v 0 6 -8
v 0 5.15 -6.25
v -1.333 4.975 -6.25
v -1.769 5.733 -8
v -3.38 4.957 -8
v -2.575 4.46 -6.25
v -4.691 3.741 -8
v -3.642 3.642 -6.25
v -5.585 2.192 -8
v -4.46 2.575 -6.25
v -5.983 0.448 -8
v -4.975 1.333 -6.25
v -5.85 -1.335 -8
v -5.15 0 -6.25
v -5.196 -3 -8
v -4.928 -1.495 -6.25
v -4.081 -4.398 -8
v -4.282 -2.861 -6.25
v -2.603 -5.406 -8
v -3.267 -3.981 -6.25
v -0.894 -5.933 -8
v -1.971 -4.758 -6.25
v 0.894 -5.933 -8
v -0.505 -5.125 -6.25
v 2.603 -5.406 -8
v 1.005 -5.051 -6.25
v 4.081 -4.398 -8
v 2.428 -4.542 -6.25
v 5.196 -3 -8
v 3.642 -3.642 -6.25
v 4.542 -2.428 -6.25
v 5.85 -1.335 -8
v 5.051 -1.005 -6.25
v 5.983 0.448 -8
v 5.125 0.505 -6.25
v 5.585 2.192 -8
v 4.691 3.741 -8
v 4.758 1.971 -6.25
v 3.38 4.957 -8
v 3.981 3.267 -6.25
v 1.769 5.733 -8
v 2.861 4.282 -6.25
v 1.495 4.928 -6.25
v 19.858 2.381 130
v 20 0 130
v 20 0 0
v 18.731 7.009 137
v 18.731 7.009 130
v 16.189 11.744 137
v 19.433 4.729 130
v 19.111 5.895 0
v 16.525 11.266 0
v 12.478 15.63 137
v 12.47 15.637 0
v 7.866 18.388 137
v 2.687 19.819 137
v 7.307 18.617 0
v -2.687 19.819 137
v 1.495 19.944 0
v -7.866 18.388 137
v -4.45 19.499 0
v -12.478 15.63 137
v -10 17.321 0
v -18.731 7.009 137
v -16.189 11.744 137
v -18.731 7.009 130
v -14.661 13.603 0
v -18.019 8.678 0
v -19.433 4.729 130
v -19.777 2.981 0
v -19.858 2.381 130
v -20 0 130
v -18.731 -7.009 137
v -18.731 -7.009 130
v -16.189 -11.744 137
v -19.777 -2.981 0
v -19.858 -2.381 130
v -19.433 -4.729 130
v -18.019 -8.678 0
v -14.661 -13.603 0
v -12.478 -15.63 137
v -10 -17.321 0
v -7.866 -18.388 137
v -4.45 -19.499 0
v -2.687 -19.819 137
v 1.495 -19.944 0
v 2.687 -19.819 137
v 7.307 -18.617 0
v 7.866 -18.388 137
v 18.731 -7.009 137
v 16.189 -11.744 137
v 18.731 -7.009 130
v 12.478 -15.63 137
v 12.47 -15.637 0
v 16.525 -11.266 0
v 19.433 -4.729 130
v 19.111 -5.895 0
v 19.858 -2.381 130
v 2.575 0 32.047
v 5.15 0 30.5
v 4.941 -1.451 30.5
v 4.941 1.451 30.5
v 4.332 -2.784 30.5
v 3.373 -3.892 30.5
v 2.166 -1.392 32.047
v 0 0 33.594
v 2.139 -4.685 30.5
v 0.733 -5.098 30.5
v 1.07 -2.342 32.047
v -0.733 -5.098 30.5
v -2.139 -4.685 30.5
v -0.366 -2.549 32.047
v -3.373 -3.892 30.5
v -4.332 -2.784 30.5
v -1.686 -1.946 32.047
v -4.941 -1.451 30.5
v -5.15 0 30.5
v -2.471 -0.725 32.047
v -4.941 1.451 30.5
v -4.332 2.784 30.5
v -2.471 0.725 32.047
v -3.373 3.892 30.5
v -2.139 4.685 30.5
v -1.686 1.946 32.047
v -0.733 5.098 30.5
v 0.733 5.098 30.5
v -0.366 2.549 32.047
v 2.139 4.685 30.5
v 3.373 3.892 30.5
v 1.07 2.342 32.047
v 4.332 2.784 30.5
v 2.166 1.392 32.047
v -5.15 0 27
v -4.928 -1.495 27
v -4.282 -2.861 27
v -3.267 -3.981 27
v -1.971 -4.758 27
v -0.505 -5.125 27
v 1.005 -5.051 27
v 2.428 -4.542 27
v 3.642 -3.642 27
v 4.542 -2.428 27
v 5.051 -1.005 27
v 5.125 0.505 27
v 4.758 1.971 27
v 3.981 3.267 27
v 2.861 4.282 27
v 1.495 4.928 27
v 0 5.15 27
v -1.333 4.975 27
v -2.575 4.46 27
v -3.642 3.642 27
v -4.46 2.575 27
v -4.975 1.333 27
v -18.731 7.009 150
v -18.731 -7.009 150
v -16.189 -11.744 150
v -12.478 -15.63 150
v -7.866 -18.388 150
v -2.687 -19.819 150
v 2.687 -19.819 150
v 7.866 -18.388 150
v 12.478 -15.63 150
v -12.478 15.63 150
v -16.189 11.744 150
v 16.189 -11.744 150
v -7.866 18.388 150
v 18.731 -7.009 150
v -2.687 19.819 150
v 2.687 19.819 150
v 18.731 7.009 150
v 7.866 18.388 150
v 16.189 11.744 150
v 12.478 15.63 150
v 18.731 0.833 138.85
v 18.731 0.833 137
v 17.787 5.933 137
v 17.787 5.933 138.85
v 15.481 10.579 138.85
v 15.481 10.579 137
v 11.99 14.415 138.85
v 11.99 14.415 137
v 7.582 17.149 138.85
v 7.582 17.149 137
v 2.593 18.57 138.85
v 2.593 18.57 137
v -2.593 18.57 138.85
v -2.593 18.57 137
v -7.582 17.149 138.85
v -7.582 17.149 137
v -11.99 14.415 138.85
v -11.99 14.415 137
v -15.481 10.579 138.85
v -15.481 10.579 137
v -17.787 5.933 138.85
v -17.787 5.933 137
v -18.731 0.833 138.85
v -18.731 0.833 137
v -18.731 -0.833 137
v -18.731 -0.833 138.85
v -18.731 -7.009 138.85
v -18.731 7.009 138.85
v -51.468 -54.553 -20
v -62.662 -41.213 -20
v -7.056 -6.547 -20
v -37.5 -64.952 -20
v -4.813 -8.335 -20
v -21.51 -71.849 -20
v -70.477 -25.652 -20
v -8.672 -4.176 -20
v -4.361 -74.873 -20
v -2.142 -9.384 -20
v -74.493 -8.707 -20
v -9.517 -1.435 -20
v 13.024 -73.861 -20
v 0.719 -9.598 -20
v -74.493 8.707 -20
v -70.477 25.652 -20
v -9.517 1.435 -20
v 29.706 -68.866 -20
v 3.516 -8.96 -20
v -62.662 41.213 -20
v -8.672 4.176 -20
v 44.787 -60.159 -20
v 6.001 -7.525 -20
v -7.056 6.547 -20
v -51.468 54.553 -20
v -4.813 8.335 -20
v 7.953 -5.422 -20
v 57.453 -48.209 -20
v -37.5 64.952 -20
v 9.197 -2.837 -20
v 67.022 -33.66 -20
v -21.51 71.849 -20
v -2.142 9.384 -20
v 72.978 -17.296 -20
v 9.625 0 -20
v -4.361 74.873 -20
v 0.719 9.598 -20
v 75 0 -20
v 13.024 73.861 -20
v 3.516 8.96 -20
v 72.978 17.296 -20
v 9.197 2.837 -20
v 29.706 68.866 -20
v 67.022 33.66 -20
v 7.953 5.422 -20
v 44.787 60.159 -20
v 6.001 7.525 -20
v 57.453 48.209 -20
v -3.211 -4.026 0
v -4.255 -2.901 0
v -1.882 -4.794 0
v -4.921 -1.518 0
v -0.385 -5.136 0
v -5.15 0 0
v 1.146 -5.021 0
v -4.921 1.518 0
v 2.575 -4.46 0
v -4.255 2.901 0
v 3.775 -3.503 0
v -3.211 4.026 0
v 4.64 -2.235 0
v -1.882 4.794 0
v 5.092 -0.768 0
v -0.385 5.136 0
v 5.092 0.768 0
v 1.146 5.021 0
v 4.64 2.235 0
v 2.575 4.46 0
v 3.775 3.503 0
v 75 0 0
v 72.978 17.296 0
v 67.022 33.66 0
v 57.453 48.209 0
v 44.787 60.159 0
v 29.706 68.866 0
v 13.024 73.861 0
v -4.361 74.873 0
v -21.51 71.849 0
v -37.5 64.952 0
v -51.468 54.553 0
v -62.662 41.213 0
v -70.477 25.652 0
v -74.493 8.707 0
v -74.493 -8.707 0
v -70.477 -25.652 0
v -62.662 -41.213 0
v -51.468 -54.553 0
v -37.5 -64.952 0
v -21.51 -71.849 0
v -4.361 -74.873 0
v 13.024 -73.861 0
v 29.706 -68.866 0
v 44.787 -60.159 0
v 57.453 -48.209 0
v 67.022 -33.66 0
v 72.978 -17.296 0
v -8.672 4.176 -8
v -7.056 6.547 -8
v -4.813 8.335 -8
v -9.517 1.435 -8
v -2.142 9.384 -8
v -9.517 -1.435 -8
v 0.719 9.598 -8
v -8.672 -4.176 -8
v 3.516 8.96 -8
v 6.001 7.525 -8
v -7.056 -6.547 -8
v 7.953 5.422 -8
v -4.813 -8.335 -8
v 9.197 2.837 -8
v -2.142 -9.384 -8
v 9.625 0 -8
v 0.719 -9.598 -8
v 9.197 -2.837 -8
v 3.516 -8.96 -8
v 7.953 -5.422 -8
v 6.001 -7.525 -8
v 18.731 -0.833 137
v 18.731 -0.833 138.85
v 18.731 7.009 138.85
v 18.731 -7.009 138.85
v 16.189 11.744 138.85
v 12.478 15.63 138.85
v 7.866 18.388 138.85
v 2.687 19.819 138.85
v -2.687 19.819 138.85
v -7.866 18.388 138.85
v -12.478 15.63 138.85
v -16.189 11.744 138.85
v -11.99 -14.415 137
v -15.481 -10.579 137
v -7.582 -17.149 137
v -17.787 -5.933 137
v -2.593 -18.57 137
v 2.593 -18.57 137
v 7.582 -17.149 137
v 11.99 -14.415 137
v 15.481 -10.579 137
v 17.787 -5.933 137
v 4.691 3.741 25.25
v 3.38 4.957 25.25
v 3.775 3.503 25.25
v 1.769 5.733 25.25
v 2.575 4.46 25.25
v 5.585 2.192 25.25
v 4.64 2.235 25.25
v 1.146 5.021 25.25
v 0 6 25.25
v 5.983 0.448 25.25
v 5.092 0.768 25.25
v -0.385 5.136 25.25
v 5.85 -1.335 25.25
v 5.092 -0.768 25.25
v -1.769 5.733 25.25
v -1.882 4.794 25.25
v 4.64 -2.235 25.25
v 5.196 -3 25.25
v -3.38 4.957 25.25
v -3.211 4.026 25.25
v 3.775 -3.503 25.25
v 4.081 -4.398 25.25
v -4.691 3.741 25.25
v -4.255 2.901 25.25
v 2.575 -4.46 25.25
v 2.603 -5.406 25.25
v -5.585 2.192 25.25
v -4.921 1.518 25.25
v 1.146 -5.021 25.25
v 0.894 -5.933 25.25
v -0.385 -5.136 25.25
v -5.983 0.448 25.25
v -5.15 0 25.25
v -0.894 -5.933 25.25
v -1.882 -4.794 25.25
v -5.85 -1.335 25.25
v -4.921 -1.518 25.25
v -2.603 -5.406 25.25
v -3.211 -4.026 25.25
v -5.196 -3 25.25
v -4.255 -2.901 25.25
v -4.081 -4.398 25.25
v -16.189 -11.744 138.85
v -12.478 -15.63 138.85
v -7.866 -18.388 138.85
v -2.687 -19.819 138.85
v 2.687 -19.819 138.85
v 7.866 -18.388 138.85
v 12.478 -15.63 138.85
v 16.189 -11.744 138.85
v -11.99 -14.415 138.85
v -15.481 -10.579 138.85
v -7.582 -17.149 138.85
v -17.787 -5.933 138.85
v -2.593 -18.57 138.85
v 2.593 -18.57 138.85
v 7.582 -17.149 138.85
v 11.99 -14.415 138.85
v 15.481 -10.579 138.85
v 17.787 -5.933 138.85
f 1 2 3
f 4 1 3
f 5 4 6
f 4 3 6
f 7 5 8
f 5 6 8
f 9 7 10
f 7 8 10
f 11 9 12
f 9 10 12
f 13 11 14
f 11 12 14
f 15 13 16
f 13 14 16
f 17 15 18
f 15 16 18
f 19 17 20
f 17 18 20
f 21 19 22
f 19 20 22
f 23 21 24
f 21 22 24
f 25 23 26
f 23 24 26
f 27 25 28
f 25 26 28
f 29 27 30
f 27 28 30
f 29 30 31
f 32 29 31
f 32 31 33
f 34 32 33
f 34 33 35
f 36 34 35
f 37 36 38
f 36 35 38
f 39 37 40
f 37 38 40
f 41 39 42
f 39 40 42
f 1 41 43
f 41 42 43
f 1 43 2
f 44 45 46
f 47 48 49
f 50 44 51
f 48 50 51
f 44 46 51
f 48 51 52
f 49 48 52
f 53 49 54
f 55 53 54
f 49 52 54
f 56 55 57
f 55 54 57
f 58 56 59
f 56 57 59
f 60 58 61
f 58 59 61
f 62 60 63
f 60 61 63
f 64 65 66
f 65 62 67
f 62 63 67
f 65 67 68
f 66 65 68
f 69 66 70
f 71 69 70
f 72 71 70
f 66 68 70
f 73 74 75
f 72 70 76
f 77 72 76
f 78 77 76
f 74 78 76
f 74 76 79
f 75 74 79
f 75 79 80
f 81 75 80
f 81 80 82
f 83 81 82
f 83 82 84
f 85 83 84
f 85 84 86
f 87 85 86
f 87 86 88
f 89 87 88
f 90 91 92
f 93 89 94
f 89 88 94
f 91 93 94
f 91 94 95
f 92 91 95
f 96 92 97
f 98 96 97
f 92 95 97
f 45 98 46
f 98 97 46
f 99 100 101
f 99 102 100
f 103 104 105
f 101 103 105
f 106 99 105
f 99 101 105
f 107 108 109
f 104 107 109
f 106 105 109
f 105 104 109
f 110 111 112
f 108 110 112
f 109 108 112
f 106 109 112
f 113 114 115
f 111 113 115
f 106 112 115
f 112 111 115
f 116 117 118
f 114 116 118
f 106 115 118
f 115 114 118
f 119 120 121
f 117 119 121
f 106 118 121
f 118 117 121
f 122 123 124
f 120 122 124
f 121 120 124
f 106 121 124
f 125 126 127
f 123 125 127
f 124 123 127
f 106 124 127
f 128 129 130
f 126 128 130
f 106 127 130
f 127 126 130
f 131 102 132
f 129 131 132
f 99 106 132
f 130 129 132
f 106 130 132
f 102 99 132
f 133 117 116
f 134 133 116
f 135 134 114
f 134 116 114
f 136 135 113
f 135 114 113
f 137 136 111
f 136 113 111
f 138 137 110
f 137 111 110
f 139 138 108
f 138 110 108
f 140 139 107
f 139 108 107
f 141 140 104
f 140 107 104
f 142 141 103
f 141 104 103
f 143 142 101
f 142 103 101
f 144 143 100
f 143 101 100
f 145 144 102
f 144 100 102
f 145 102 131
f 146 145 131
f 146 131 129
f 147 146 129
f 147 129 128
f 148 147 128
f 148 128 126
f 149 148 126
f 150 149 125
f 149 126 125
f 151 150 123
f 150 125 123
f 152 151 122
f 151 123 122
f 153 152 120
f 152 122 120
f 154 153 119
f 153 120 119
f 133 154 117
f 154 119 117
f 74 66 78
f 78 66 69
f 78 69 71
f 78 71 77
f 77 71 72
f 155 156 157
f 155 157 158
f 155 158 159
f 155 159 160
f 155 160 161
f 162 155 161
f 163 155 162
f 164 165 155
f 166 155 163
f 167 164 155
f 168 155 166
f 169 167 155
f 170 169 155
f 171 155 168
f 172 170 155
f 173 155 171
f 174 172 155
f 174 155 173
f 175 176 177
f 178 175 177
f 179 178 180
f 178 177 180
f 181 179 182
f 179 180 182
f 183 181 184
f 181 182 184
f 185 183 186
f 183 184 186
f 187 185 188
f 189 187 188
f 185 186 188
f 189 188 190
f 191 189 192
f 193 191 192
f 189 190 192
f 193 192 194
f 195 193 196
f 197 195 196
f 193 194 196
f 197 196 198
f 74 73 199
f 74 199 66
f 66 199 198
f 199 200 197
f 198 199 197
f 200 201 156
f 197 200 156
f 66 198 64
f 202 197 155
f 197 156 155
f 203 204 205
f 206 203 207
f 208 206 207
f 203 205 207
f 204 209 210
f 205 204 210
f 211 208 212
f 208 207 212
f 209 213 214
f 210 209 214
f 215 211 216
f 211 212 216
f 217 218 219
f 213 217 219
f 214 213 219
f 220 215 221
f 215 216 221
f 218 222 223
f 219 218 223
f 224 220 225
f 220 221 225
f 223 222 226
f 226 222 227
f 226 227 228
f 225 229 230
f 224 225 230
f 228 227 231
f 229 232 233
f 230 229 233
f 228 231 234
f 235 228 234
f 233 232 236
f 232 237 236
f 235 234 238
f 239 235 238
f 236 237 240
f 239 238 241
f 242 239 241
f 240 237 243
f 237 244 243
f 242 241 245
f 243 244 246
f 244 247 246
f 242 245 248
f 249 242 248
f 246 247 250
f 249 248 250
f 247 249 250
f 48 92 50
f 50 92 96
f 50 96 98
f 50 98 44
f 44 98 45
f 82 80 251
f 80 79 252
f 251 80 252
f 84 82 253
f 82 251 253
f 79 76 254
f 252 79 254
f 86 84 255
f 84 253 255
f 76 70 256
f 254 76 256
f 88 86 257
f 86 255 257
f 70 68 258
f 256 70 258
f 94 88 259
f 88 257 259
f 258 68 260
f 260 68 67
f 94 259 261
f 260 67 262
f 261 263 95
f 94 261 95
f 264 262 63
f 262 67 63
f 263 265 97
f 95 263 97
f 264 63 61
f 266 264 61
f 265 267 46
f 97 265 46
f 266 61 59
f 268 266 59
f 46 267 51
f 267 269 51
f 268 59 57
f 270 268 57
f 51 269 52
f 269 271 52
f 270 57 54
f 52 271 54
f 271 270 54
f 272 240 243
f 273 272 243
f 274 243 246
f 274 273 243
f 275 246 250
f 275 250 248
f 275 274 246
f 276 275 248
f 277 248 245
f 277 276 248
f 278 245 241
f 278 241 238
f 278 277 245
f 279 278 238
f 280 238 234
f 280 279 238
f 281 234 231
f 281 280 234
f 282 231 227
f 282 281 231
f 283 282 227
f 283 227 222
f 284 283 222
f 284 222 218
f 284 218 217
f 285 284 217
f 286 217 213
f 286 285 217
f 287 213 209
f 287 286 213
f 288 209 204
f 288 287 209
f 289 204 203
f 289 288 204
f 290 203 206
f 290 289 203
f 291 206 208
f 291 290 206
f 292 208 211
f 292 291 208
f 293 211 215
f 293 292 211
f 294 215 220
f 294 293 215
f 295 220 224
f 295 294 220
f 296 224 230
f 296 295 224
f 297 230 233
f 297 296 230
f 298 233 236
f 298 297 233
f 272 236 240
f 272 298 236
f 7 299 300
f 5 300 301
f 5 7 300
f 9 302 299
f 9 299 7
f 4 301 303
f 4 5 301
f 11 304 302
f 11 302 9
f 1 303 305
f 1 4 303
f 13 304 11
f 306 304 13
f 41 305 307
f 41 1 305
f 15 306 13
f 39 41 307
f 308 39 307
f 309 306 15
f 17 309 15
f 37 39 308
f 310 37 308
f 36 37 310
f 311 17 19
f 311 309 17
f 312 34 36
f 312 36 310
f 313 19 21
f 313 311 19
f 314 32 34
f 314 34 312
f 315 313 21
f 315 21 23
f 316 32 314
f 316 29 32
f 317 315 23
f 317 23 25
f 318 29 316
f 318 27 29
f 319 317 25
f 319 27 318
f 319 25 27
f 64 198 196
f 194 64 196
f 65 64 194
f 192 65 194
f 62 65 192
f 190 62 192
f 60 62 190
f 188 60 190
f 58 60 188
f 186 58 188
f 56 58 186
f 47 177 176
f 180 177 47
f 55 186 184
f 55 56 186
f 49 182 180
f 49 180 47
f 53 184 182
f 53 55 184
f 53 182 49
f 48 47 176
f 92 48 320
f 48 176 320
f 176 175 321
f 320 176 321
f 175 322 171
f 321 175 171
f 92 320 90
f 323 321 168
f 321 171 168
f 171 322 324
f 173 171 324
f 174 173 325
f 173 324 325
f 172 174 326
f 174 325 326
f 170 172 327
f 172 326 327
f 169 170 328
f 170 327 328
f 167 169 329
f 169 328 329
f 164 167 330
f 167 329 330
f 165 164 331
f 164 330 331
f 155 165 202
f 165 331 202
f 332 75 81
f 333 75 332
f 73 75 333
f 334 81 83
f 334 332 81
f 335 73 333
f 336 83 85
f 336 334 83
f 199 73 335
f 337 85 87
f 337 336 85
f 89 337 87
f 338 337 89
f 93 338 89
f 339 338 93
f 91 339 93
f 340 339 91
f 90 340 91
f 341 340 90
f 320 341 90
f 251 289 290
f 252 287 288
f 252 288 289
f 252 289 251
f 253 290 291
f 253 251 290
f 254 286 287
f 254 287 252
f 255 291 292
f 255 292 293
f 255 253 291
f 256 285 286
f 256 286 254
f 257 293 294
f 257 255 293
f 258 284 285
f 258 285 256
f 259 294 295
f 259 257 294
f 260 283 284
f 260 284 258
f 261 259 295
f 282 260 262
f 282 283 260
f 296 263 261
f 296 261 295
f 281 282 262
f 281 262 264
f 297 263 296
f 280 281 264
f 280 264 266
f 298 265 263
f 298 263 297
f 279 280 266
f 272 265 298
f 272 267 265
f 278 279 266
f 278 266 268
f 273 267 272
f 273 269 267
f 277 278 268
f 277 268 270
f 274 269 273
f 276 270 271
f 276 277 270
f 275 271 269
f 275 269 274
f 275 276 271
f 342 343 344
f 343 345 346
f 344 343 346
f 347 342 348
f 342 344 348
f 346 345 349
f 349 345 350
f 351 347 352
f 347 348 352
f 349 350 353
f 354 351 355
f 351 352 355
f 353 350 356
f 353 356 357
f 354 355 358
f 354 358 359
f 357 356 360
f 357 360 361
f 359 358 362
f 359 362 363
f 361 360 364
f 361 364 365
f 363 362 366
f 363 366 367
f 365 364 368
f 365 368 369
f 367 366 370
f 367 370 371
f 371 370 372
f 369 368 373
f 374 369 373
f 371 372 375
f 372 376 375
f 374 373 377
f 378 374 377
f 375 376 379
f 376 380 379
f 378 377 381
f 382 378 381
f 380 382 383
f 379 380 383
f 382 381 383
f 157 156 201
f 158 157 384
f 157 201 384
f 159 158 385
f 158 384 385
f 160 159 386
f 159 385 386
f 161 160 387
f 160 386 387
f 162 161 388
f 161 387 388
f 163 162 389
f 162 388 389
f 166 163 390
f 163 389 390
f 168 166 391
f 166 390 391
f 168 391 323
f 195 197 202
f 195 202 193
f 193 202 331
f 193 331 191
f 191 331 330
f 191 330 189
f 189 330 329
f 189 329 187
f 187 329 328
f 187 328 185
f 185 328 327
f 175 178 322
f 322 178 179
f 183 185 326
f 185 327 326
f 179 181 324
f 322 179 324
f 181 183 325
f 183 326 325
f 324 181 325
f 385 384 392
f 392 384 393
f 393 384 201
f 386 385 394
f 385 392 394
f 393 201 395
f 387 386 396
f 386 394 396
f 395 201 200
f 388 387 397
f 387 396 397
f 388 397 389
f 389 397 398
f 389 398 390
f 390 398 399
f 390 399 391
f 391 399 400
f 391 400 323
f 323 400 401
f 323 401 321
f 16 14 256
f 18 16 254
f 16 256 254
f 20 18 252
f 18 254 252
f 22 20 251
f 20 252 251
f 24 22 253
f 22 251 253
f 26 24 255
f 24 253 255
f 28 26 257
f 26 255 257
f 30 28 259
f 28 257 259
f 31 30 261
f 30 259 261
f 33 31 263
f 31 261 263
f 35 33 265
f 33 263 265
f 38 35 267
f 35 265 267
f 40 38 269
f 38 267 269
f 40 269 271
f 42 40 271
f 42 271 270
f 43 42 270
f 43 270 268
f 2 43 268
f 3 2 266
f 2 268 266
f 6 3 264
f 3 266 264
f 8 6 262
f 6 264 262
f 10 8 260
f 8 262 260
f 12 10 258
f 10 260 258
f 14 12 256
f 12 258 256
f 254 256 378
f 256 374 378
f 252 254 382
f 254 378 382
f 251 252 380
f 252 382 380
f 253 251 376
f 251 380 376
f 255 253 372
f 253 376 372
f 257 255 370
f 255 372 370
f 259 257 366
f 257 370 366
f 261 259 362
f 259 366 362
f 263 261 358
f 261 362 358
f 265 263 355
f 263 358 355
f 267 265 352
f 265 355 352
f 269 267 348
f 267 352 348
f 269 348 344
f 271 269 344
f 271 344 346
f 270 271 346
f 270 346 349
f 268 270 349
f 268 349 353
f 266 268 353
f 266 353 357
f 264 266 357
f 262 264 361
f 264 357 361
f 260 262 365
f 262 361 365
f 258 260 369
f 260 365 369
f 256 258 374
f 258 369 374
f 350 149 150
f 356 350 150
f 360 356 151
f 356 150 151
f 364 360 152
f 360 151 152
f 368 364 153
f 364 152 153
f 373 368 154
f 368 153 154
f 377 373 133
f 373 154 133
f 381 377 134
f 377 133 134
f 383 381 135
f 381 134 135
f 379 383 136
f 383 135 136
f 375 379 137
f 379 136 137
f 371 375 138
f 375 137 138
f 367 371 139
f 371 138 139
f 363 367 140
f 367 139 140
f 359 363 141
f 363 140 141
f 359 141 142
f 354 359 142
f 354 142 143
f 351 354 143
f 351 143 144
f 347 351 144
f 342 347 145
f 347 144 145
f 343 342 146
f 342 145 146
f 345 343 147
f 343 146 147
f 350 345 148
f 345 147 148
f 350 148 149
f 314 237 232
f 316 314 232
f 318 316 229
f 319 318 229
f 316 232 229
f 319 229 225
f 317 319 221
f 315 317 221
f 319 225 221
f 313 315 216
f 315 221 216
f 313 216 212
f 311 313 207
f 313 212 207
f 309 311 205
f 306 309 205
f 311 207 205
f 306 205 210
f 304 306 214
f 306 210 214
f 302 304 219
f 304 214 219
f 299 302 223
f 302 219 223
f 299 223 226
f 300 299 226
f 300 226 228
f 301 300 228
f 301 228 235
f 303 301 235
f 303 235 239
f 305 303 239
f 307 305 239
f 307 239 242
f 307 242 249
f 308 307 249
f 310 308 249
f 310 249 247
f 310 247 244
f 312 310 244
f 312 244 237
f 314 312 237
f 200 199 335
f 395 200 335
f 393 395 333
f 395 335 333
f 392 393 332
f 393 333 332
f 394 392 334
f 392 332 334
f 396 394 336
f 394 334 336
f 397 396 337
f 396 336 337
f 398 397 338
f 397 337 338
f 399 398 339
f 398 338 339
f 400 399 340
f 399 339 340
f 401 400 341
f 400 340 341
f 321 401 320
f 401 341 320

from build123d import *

# Parameters (mm, degrees)
F0_R             = 75
F0_R_2           = 20
F1_DEPTH         = 20
F2_DEPTH         = 150
F4_D             = 10.3
F4_DEPTH         = 50.5
F4_CBORE_D       = 19.25
F4_CBORE_DEPTH   = 12
F4_TIP           = 3.094432188
F4_2_D           = 10.3
F4_2_DEPTH       = 50.5
F4_2_CBORE_D     = 19.25
F4_2_CBORE_DEPTH = 12
F4_2_TIP         = 3.094432188
F8_DEPTH         = 20
F10_R            = 20
F10_R_2          = 18.75
F11_DEPTH        = 1.85


with BuildPart() as f1:
    # F0 (on Top) → F1 (new body)
    with BuildSketch(Plane.XY):
        Circle(F0_R)
        Circle(F0_R_2, mode=Mode.SUBTRACT)
        Circle(F0_R_2)
    extrude(amount=-F1_DEPTH)

    # F4
    with Locations(Plane(origin=(0, 0, -20), x_dir=(1, 0, 0), z_dir=(0, 0, -1))):
        with Locations((0, 0)):
            CounterBoreHole(F4_D / 2, F4_CBORE_D / 2, F4_CBORE_DEPTH, depth=F4_DEPTH)
            with Locations((0, 0, -(F4_DEPTH + F4_TIP / 2))):  # 118° drill point
                Cone(0, F4_D / 2, F4_TIP, mode=Mode.SUBTRACT)


with BuildPart() as f2:
    # F0 (on Top) → F2 (new body)
    with BuildSketch(Plane.XY):
        Circle(F0_R_2)
    extrude(amount=F2_DEPTH)

    # F4#2
    with Locations(Plane(origin=(0, 0, -20), x_dir=(1, 0, 0), z_dir=(0, 0, -1))):
        with Locations((0, 0)):
            CounterBoreHole(F4_2_D / 2, F4_2_CBORE_D / 2, F4_2_CBORE_DEPTH, depth=F4_2_DEPTH)
            with Locations((0, 0, -(F4_2_DEPTH + F4_2_TIP / 2))):  # 118° drill point
                Cone(0, F4_2_D / 2, F4_2_TIP, mode=Mode.SUBTRACT)


with BuildPart() as f6_tool:
    # F5 (on Right) → F6 (revolve)
    with BuildSketch(Plane.YZ):
        Polygon((6, 25.25), (5.15, 27), (5.15, 25.25), align=None)
        Polygon((5.15, -8), (6, -8), (5.15, -6.25), align=None)
    revolve(axis=Axis((0, 0, 3.5), (0, 0, 1)))


with BuildPart() as f1_1:
    add(f1.part)

    # F6: cut by f6_tool
    add(f6_tool.part, mode=Mode.SUBTRACT)


with BuildPart() as f2_1:
    add(f2.part)

    # F6: cut by f6_tool
    add(f6_tool.part, mode=Mode.SUBTRACT)

    # F7 (on face) → F8 (cut)
    with BuildSketch(Plane.XY.offset(150)):
        with BuildLine():
            Line((-20, 0), (-18.7314898701, 0))
            Line((-18.7314898701, 0), (-18.7314898701, 7.0093713873))
            ThreePointArc((-18.7314898701, 7.0093713873), (-19.6803175457, 3.5616149846), (-20, 0))
        make_face()
        with BuildLine():
            Line((-18.7314898701, -7.0093713873), (-18.7314898701, 0))
            Line((-18.7314898701, 0), (-20, 0))
            ThreePointArc((-20, 0), (-19.6803175457, -3.5616149846), (-18.7314898701, -7.0093713873))
        make_face()
        with BuildLine():
            ThreePointArc((20, 0), (19.6803175457, 3.5616149846), (18.7314898701, 7.0093713873))
            Line((18.7314898701, 7.0093713873), (18.7314898701, 0))
            Line((18.7314898701, 0), (18.7314898701, -7.0093713873))
            ThreePointArc((18.7314898701, -7.0093713873), (19.6803175457, -3.5616149846), (20, 0))
        make_face()
    extrude(amount=-F8_DEPTH, mode=Mode.SUBTRACT)

    # F10 (on offset) → F11 (cut)
    with BuildSketch(Plane.XY.offset(137)):
        Circle(F10_R)
        Circle(F10_R_2, mode=Mode.SUBTRACT)
    extrude(amount=F11_DEPTH, mode=Mode.SUBTRACT)


solid = Compound([f1_1.part, f2_1.part])
